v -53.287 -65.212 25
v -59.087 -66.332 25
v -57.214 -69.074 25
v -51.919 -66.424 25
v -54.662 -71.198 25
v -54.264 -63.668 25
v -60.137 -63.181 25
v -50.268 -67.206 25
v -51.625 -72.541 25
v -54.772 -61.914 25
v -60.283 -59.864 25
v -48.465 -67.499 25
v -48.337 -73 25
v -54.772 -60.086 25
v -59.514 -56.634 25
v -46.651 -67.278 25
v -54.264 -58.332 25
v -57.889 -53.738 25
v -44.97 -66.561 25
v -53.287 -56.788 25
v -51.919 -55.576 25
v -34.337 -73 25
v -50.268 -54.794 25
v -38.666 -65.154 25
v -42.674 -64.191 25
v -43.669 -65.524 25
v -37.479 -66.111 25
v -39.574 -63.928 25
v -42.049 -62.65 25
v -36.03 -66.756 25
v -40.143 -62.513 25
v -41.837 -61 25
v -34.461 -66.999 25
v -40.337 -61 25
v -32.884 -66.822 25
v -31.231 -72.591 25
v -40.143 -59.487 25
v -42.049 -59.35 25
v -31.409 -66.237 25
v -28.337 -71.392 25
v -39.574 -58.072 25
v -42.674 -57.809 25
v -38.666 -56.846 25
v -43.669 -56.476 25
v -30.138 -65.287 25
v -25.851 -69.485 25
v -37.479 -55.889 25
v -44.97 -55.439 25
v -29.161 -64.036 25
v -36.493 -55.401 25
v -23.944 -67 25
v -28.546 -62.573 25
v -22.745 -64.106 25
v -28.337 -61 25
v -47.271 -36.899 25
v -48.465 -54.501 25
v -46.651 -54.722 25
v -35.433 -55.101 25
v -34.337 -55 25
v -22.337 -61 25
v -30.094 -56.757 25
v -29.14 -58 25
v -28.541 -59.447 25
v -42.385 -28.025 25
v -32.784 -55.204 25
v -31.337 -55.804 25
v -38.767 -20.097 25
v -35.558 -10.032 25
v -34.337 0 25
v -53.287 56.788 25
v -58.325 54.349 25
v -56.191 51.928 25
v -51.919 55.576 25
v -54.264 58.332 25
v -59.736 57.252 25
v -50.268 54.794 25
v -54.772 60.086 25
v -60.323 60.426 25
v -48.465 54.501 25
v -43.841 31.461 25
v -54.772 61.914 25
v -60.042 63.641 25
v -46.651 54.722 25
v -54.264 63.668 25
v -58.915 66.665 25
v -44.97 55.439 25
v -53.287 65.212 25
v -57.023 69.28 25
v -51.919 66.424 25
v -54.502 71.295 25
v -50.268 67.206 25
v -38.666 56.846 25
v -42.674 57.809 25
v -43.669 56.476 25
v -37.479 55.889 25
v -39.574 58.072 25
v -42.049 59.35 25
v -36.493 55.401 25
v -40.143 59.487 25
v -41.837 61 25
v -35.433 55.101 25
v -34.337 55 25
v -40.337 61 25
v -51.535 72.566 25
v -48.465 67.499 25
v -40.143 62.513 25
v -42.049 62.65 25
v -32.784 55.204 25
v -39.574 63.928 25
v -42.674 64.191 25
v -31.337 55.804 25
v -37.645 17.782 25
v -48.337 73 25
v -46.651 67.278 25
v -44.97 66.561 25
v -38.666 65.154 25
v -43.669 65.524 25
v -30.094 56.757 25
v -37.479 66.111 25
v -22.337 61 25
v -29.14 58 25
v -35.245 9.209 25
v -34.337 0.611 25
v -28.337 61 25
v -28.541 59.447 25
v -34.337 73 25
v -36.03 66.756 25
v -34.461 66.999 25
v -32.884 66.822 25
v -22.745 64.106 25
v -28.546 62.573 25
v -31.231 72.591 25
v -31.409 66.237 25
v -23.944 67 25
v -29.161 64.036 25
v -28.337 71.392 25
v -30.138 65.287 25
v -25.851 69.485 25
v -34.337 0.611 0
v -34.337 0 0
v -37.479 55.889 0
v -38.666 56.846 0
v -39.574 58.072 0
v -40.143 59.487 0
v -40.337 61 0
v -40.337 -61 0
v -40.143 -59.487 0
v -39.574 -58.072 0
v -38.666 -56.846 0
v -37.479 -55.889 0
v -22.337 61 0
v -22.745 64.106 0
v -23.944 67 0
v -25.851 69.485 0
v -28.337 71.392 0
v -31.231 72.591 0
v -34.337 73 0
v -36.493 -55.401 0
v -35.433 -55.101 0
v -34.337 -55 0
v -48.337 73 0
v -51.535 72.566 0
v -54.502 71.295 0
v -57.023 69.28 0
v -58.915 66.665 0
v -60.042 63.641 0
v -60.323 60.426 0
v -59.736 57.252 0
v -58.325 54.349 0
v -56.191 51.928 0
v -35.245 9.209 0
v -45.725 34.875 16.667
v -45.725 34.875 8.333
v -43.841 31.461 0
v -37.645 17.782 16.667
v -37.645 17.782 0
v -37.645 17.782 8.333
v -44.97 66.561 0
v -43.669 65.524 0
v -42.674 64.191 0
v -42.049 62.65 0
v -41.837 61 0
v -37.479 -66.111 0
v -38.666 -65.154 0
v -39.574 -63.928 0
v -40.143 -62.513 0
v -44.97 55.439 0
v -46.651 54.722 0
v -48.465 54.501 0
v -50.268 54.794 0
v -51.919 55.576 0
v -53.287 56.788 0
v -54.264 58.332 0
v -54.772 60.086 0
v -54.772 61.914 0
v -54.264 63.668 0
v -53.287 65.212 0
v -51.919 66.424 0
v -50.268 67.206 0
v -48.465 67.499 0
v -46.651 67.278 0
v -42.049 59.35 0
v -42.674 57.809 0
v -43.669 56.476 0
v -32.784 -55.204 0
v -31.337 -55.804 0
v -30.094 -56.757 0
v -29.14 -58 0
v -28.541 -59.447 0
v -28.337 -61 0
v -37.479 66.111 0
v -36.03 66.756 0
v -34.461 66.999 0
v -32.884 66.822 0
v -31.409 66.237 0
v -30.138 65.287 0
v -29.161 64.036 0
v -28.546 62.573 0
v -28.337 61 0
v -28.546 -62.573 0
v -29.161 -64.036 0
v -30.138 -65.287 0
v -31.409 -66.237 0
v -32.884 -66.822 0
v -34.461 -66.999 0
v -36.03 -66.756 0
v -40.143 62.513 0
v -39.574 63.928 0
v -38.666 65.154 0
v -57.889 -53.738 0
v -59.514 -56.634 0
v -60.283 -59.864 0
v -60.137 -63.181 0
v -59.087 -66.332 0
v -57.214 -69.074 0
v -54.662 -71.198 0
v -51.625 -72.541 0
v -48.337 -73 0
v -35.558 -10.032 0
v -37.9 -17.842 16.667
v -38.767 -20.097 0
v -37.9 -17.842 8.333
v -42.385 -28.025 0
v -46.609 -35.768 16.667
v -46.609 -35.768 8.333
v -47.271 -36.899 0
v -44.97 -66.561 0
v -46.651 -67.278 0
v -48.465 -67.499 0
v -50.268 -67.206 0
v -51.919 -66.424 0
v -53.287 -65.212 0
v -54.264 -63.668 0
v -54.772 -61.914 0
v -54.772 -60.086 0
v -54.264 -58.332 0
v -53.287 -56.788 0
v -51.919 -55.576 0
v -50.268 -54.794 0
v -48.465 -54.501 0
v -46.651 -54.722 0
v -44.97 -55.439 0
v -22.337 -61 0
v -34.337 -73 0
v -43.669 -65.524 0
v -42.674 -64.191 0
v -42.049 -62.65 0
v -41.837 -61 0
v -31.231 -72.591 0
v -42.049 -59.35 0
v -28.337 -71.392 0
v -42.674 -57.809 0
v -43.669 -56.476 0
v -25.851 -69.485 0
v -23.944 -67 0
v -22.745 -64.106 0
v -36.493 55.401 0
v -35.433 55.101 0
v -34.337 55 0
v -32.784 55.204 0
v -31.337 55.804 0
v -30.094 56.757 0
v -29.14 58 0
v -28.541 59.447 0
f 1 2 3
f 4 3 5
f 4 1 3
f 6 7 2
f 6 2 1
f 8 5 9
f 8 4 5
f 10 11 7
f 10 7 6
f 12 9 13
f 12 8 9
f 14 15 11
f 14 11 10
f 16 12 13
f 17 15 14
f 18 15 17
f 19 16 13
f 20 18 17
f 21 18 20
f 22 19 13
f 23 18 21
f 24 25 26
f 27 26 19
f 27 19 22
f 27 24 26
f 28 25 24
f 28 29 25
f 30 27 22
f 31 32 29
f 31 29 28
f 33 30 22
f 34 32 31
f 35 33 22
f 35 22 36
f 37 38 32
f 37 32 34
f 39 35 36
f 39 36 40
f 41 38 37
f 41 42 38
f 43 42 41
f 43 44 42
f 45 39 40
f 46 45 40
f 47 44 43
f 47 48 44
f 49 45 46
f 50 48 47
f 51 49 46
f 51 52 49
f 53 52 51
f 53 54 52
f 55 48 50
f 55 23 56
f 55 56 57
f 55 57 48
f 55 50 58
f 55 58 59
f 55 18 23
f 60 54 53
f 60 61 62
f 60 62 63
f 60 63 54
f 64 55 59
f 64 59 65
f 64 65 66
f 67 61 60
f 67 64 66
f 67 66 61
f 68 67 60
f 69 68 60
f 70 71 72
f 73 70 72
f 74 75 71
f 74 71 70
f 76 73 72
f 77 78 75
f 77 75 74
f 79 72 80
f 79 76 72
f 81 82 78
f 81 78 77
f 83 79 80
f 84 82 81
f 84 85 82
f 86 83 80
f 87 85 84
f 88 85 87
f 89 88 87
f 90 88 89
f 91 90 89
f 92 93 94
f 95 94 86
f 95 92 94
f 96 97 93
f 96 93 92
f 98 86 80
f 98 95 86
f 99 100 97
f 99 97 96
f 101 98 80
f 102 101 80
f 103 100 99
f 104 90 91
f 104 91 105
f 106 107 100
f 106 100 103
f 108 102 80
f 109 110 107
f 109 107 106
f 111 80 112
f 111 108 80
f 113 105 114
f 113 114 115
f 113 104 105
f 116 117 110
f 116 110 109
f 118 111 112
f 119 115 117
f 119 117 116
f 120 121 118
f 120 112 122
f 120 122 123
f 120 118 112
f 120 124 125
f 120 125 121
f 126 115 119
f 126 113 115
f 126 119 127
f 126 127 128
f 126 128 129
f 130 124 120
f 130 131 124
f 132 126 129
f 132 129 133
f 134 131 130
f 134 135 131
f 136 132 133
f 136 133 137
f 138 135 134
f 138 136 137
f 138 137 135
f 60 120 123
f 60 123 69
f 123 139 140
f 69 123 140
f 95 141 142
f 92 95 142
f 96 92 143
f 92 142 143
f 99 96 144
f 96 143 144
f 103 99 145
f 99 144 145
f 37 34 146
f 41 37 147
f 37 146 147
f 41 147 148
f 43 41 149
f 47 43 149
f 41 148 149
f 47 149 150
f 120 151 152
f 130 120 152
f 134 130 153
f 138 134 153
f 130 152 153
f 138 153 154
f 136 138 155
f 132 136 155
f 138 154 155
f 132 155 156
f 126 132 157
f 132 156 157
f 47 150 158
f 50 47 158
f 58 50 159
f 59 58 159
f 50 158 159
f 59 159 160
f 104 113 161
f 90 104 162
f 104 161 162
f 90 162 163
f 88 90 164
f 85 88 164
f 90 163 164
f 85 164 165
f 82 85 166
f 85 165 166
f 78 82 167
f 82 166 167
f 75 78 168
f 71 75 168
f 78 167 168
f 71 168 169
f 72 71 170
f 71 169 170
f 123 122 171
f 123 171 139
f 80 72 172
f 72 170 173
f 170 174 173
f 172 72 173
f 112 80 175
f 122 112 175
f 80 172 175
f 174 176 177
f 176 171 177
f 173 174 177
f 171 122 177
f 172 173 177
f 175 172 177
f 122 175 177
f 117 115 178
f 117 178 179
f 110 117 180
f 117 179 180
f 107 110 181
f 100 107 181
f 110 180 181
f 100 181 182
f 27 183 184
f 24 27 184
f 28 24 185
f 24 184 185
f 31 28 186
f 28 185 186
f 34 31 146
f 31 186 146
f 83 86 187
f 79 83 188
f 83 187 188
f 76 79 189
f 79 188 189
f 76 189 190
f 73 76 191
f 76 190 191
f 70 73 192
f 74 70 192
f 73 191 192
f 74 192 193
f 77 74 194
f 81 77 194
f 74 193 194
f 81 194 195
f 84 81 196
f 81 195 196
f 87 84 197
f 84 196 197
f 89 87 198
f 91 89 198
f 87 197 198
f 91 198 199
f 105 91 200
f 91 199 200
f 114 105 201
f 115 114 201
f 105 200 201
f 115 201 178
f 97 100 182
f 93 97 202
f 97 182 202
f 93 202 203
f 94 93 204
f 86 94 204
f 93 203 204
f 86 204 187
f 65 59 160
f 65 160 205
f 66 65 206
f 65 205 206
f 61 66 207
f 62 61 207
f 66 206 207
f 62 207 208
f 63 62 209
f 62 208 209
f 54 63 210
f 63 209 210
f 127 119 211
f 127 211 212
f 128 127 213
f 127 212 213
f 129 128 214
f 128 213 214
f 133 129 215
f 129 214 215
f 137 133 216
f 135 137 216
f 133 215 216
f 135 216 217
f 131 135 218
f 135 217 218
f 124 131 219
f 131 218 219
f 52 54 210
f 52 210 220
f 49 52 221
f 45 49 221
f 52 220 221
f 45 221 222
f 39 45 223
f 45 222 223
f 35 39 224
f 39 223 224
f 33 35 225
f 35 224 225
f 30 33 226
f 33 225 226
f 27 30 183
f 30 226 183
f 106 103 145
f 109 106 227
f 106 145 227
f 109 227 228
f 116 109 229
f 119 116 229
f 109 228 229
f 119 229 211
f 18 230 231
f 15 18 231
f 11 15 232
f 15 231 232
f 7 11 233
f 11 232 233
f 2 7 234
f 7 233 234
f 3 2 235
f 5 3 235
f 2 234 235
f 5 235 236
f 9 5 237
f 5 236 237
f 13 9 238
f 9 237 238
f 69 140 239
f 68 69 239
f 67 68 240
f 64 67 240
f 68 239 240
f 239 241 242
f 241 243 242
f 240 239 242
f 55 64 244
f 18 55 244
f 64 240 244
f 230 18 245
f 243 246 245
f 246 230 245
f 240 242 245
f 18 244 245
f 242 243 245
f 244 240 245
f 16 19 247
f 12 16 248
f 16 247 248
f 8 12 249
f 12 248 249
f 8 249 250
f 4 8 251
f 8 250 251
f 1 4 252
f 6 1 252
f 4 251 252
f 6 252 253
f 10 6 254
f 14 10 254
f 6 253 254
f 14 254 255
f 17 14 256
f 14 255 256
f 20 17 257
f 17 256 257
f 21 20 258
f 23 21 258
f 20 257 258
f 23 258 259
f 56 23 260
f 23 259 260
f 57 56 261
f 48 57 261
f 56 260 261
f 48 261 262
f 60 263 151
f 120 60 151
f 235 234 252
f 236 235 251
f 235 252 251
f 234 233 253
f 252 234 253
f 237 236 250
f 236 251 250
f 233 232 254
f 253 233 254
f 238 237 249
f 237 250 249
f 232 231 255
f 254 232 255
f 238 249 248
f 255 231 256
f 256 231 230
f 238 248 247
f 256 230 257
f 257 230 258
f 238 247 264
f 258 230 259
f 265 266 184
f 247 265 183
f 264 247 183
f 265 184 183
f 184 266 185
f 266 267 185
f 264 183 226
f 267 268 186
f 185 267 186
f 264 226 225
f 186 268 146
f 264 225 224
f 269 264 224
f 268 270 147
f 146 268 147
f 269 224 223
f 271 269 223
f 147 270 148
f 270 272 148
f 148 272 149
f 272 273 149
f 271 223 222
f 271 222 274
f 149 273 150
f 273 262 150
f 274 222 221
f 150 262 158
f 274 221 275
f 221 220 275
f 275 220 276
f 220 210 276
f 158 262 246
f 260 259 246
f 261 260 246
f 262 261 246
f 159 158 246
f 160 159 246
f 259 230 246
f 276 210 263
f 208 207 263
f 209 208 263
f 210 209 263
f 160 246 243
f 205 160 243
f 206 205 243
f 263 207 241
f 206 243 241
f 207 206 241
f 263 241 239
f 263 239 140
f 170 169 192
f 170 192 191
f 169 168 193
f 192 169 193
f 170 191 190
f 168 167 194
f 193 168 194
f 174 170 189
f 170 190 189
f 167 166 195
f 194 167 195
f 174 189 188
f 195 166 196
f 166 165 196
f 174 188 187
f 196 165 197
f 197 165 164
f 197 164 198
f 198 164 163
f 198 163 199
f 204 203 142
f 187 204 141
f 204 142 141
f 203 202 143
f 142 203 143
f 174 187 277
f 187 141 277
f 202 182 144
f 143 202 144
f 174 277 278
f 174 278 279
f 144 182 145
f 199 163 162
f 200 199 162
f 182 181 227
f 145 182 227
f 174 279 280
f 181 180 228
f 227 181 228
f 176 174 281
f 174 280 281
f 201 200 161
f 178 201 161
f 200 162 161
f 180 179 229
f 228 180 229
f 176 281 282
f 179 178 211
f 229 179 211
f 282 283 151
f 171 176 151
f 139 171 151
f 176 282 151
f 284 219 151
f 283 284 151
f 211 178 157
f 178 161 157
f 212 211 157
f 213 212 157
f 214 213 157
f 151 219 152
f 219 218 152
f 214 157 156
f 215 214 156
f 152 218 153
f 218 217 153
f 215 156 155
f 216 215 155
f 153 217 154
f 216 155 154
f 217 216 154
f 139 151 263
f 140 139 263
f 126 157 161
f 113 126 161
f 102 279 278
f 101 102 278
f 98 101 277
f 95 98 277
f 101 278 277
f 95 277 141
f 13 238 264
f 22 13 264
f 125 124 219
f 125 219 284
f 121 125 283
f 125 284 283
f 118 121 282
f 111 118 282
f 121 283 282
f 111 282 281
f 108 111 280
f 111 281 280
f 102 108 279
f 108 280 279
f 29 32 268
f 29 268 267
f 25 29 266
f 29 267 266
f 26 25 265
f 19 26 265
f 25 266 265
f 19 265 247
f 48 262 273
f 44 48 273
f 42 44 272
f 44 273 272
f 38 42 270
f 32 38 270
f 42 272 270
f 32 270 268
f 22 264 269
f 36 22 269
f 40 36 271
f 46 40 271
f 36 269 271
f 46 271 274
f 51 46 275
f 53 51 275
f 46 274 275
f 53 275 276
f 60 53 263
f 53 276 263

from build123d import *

# Parameters (mm, degrees)
F1_DEPTH = 25


with BuildPart() as f1:
    # F0 (on Top) → F1 (new body)
    with BuildSketch(Plane.XY):
        with BuildLine():
            ThreePointArc((-37.4794265696, 66.11101252), (-31.4088692079, 66.2372293657), (-28.3365694268, 61))
            ThreePointArc((-28.3365694268, 61), (-30.0939287397, 56.7573593129), (-34.3365694268, 55))
            Line((-34.3365694268, 55), (-34.3365694268, 49))
            ThreePointArc((-34.3365694268, 49), (-25.8512880525, 52.5147186258), (-22.3365694268, 61))
            ThreePointArc((-22.3365694268, 61), (-25.8512880525, 69.4852813742), (-34.3365694268, 73))
            ThreePointArc((-34.3365694268, 73), (-38.0134205158, 72.4228177815), (-41.3365694268, 70.7467943448))
            ThreePointArc((-41.3365694268, 70.7467943448), (-39.1120365911, 68.6751543283), (-37.4794265696, 66.11101252))
        make_face()
        with BuildLine():
            ThreePointArc((-48.3365694268, 73), (-44.6597183377, 72.4228177815), (-41.3365694268, 70.7467943448))
            ThreePointArc((-41.3365694268, 70.7467943448), (-38.0134205158, 72.4228177815), (-34.3365694268, 73))
            Line((-34.3365694268, 73), (-48.3365694268, 73))
        make_face()
        with BuildLine():
            ThreePointArc((-44.9704979982, 66.5605362275), (-43.3985807086, 68.8663810948), (-41.3365694268, 70.7467943448))
            ThreePointArc((-41.3365694268, 70.7467943448), (-44.6597183377, 72.4228177815), (-48.3365694268, 73))
            ThreePointArc((-48.3365694268, 73), (-59.5808573116, 65.1911800205), (-56.1910418813, 51.927664994))
            ThreePointArc((-56.1910418813, 51.927664994), (-48.8808622191, 49.0123502989), (-41.3365694268, 51.2532056552))
            ThreePointArc((-41.3365694268, 51.2532056552), (-43.3985807086, 53.1336189052), (-44.9704979982, 55.4394637725))
            ThreePointArc((-44.9704979982, 55.4394637725), (-54.8365694268, 61), (-44.9704979982, 66.5605362275))
        make_face()
        with BuildLine():
            ThreePointArc((-22.3365694268, 61), (-25.8512880525, 52.5147186258), (-34.3365694268, 49))
            Line((-34.3365694268, 49), (-34.3365694268, 0.6114759034))
            add(Edge.make_bspline(
                [(-34.3365694268, 0.6114759034), (-34.3350602132, 0.4076747809), (-34.3350542847, 0.2038495718), (-34.3365694268, 0)],
                knots=[0.4891390328, 0.4891390328, 0.4891390328, 0.4891390328, 0.4949274413, 0.4949274413, 0.4949274413, 0.4949274413], degree=3))
            Line((-34.3365694268, 0), (-34.3365694268, -49))
            ThreePointArc((-34.3365694268, -49), (-25.8512880525, -52.5147186258), (-22.3365694268, -61))
            Line((-22.3365694268, -61), (-22.3365694268, 61))
        make_face()
        with BuildLine():
            Line((-34.3365694268, 0.6114759034), (-34.3365694268, 49))
            ThreePointArc((-34.3365694268, 49), (-38.0134205158, 49.5771822185), (-41.3365694268, 51.2532056552))
            ThreePointArc((-41.3365694268, 51.2532056552), (-48.8808622191, 49.0123502989), (-56.1910418813, 51.927664994))
            add(Edge.make_bspline(
                [(-56.1910418813, 51.927664994), (-45.3262801206, 34.8831717712), (-34.4641028, 17.8333225018), (-34.3365694268, 0.6114759034)],
                knots=[0, 0, 0, 0, 0.4891390328, 0.4891390328, 0.4891390328, 0.4891390328], degree=3))
        make_face()
        with BuildLine():
            add(Edge.make_bspline(
                [(-34.3365694268, 0.6114759034), (-34.3350602132, 0.4076747809), (-34.3350542847, 0.2038495718), (-34.3365694268, 0)],
                knots=[0.4891390328, 0.4891390328, 0.4891390328, 0.4891390328, 0.4949274413, 0.4949274413, 0.4949274413, 0.4949274413], degree=3))
            Line((-34.3365694268, 0.6114759034), (-34.3365694268, 0))
        make_face()
        with BuildLine():
            Line((-34.3365694268, -49), (-34.3365694268, 0))
            add(Edge.make_bspline(
                [(-34.3365694268, 0), (-34.4687744467, -17.7870694727), (-46.1817789108, -35.7596268619), (-57.889438977, -53.7375841928)],
                knots=[0.4949274413, 0.4949274413, 0.4949274413, 0.4949274413, 1, 1, 1, 1], degree=3))
            ThreePointArc((-57.889438977, -53.7375841928), (-50.1176701861, -49.1329161086), (-41.3365694268, -51.2532056552))
            ThreePointArc((-41.3365694268, -51.2532056552), (-38.0134205158, -49.5771822185), (-34.3365694268, -49))
        make_face()
        with BuildLine():
            ThreePointArc((-34.3365694268, -73), (-25.8512880525, -69.4852813742), (-22.3365694268, -61))
            ThreePointArc((-22.3365694268, -61), (-25.8512880525, -52.5147186258), (-34.3365694268, -49))
            Line((-34.3365694268, -49), (-34.3365694268, -55))
            ThreePointArc((-34.3365694268, -55), (-30.0939287397, -56.7573593129), (-28.3365694268, -61))
            ThreePointArc((-28.3365694268, -61), (-31.4088692079, -66.2372293657), (-37.4794265696, -66.11101252))
            ThreePointArc((-37.4794265696, -66.11101252), (-39.1120365911, -68.6751543283), (-41.3365694268, -70.7467943448))
            ThreePointArc((-41.3365694268, -70.7467943448), (-38.0134205158, -72.4228177815), (-34.3365694268, -73))
        make_face()
        with BuildLine():
            ThreePointArc((-41.3365694268, -51.2532056552), (-50.1176701861, -49.1329161086), (-57.889438977, -53.7375841928))
            ThreePointArc((-57.889438977, -53.7375841928), (-59.087127312, -66.3315574795), (-48.3365694268, -73))
            ThreePointArc((-48.3365694268, -73), (-44.6597183377, -72.4228177815), (-41.3365694268, -70.7467943448))
            ThreePointArc((-41.3365694268, -70.7467943448), (-43.3985807086, -68.8663810948), (-44.9704979982, -66.5605362275))
            ThreePointArc((-44.9704979982, -66.5605362275), (-54.8365694268, -61), (-44.9704979982, -55.4394637725))
            ThreePointArc((-44.9704979982, -55.4394637725), (-43.3985807086, -53.1336189052), (-41.3365694268, -51.2532056552))
        make_face()
        with BuildLine():
            Line((-48.3365694268, -73), (-34.3365694268, -73))
            ThreePointArc((-34.3365694268, -73), (-38.0134205158, -72.4228177815), (-41.3365694268, -70.7467943448))
            ThreePointArc((-41.3365694268, -70.7467943448), (-44.6597183377, -72.4228177815), (-48.3365694268, -73))
        make_face()
        with BuildLine():
            ThreePointArc((-37.4794265696, 55.88898748), (-39.5737987924, 58.0722997812), (-40.3365694268, 61))
            Line((-40.3365694268, 61), (-41.8365694268, 61))
            ThreePointArc((-41.8365694268, 61), (-42.6739965007, 57.8085633553), (-44.9704979982, 55.4394637725))
            ThreePointArc((-44.9704979982, 55.4394637725), (-43.3985807086, 53.1336189052), (-41.3365694268, 51.2532056552))
            ThreePointArc((-41.3365694268, 51.2532056552), (-39.1120365911, 53.3248456717), (-37.4794265696, 55.88898748))
        make_face()
        with BuildLine():
            ThreePointArc((-40.3365694268, 61), (-39.5737987924, 63.9277002188), (-37.4794265696, 66.11101252))
            ThreePointArc((-37.4794265696, 66.11101252), (-39.1120365911, 68.6751543283), (-41.3365694268, 70.7467943448))
            ThreePointArc((-41.3365694268, 70.7467943448), (-43.3985807086, 68.8663810948), (-44.9704979982, 66.5605362275))
            ThreePointArc((-44.9704979982, 66.5605362275), (-42.6739965007, 64.1914366447), (-41.8365694268, 61))
            Line((-41.8365694268, 61), (-40.3365694268, 61))
        make_face()
        with BuildLine():
            Line((-34.3365694268, 49), (-34.3365694268, 55))
            ThreePointArc((-34.3365694268, 55), (-35.9696531478, 55.2265229229), (-37.4794265696, 55.88898748))
            ThreePointArc((-37.4794265696, 55.88898748), (-39.1120365911, 53.3248456717), (-41.3365694268, 51.2532056552))
            ThreePointArc((-41.3365694268, 51.2532056552), (-38.0134205158, 49.5771822185), (-34.3365694268, 49))
        make_face()
        with BuildLine():
            Line((-34.3365694268, -55), (-34.3365694268, -49))
            ThreePointArc((-34.3365694268, -49), (-38.0134205158, -49.5771822185), (-41.3365694268, -51.2532056552))
            ThreePointArc((-41.3365694268, -51.2532056552), (-39.1120365911, -53.3248456717), (-37.4794265696, -55.88898748))
            ThreePointArc((-37.4794265696, -55.88898748), (-35.9696531478, -55.2265229229), (-34.3365694268, -55))
        make_face()
        with BuildLine():
            ThreePointArc((-37.4794265696, -55.88898748), (-39.1120365911, -53.3248456717), (-41.3365694268, -51.2532056552))
            ThreePointArc((-41.3365694268, -51.2532056552), (-43.3985807086, -53.1336189052), (-44.9704979982, -55.4394637725))
            ThreePointArc((-44.9704979982, -55.4394637725), (-42.6739965007, -57.8085633553), (-41.8365694268, -61))
            Line((-41.8365694268, -61), (-40.3365694268, -61))
            ThreePointArc((-40.3365694268, -61), (-39.5737987924, -58.0722997812), (-37.4794265696, -55.88898748))
        make_face()
        with BuildLine():
            ThreePointArc((-44.9704979982, -66.5605362275), (-43.3985807086, -68.8663810948), (-41.3365694268, -70.7467943448))
            ThreePointArc((-41.3365694268, -70.7467943448), (-39.1120365911, -68.6751543283), (-37.4794265696, -66.11101252))
            ThreePointArc((-37.4794265696, -66.11101252), (-39.5737987924, -63.9277002188), (-40.3365694268, -61))
            Line((-40.3365694268, -61), (-41.8365694268, -61))
            ThreePointArc((-41.8365694268, -61), (-42.6739965007, -64.1914366447), (-44.9704979982, -66.5605362275))
        make_face()
    extrude(amount=F1_DEPTH)


solid = f1.part
